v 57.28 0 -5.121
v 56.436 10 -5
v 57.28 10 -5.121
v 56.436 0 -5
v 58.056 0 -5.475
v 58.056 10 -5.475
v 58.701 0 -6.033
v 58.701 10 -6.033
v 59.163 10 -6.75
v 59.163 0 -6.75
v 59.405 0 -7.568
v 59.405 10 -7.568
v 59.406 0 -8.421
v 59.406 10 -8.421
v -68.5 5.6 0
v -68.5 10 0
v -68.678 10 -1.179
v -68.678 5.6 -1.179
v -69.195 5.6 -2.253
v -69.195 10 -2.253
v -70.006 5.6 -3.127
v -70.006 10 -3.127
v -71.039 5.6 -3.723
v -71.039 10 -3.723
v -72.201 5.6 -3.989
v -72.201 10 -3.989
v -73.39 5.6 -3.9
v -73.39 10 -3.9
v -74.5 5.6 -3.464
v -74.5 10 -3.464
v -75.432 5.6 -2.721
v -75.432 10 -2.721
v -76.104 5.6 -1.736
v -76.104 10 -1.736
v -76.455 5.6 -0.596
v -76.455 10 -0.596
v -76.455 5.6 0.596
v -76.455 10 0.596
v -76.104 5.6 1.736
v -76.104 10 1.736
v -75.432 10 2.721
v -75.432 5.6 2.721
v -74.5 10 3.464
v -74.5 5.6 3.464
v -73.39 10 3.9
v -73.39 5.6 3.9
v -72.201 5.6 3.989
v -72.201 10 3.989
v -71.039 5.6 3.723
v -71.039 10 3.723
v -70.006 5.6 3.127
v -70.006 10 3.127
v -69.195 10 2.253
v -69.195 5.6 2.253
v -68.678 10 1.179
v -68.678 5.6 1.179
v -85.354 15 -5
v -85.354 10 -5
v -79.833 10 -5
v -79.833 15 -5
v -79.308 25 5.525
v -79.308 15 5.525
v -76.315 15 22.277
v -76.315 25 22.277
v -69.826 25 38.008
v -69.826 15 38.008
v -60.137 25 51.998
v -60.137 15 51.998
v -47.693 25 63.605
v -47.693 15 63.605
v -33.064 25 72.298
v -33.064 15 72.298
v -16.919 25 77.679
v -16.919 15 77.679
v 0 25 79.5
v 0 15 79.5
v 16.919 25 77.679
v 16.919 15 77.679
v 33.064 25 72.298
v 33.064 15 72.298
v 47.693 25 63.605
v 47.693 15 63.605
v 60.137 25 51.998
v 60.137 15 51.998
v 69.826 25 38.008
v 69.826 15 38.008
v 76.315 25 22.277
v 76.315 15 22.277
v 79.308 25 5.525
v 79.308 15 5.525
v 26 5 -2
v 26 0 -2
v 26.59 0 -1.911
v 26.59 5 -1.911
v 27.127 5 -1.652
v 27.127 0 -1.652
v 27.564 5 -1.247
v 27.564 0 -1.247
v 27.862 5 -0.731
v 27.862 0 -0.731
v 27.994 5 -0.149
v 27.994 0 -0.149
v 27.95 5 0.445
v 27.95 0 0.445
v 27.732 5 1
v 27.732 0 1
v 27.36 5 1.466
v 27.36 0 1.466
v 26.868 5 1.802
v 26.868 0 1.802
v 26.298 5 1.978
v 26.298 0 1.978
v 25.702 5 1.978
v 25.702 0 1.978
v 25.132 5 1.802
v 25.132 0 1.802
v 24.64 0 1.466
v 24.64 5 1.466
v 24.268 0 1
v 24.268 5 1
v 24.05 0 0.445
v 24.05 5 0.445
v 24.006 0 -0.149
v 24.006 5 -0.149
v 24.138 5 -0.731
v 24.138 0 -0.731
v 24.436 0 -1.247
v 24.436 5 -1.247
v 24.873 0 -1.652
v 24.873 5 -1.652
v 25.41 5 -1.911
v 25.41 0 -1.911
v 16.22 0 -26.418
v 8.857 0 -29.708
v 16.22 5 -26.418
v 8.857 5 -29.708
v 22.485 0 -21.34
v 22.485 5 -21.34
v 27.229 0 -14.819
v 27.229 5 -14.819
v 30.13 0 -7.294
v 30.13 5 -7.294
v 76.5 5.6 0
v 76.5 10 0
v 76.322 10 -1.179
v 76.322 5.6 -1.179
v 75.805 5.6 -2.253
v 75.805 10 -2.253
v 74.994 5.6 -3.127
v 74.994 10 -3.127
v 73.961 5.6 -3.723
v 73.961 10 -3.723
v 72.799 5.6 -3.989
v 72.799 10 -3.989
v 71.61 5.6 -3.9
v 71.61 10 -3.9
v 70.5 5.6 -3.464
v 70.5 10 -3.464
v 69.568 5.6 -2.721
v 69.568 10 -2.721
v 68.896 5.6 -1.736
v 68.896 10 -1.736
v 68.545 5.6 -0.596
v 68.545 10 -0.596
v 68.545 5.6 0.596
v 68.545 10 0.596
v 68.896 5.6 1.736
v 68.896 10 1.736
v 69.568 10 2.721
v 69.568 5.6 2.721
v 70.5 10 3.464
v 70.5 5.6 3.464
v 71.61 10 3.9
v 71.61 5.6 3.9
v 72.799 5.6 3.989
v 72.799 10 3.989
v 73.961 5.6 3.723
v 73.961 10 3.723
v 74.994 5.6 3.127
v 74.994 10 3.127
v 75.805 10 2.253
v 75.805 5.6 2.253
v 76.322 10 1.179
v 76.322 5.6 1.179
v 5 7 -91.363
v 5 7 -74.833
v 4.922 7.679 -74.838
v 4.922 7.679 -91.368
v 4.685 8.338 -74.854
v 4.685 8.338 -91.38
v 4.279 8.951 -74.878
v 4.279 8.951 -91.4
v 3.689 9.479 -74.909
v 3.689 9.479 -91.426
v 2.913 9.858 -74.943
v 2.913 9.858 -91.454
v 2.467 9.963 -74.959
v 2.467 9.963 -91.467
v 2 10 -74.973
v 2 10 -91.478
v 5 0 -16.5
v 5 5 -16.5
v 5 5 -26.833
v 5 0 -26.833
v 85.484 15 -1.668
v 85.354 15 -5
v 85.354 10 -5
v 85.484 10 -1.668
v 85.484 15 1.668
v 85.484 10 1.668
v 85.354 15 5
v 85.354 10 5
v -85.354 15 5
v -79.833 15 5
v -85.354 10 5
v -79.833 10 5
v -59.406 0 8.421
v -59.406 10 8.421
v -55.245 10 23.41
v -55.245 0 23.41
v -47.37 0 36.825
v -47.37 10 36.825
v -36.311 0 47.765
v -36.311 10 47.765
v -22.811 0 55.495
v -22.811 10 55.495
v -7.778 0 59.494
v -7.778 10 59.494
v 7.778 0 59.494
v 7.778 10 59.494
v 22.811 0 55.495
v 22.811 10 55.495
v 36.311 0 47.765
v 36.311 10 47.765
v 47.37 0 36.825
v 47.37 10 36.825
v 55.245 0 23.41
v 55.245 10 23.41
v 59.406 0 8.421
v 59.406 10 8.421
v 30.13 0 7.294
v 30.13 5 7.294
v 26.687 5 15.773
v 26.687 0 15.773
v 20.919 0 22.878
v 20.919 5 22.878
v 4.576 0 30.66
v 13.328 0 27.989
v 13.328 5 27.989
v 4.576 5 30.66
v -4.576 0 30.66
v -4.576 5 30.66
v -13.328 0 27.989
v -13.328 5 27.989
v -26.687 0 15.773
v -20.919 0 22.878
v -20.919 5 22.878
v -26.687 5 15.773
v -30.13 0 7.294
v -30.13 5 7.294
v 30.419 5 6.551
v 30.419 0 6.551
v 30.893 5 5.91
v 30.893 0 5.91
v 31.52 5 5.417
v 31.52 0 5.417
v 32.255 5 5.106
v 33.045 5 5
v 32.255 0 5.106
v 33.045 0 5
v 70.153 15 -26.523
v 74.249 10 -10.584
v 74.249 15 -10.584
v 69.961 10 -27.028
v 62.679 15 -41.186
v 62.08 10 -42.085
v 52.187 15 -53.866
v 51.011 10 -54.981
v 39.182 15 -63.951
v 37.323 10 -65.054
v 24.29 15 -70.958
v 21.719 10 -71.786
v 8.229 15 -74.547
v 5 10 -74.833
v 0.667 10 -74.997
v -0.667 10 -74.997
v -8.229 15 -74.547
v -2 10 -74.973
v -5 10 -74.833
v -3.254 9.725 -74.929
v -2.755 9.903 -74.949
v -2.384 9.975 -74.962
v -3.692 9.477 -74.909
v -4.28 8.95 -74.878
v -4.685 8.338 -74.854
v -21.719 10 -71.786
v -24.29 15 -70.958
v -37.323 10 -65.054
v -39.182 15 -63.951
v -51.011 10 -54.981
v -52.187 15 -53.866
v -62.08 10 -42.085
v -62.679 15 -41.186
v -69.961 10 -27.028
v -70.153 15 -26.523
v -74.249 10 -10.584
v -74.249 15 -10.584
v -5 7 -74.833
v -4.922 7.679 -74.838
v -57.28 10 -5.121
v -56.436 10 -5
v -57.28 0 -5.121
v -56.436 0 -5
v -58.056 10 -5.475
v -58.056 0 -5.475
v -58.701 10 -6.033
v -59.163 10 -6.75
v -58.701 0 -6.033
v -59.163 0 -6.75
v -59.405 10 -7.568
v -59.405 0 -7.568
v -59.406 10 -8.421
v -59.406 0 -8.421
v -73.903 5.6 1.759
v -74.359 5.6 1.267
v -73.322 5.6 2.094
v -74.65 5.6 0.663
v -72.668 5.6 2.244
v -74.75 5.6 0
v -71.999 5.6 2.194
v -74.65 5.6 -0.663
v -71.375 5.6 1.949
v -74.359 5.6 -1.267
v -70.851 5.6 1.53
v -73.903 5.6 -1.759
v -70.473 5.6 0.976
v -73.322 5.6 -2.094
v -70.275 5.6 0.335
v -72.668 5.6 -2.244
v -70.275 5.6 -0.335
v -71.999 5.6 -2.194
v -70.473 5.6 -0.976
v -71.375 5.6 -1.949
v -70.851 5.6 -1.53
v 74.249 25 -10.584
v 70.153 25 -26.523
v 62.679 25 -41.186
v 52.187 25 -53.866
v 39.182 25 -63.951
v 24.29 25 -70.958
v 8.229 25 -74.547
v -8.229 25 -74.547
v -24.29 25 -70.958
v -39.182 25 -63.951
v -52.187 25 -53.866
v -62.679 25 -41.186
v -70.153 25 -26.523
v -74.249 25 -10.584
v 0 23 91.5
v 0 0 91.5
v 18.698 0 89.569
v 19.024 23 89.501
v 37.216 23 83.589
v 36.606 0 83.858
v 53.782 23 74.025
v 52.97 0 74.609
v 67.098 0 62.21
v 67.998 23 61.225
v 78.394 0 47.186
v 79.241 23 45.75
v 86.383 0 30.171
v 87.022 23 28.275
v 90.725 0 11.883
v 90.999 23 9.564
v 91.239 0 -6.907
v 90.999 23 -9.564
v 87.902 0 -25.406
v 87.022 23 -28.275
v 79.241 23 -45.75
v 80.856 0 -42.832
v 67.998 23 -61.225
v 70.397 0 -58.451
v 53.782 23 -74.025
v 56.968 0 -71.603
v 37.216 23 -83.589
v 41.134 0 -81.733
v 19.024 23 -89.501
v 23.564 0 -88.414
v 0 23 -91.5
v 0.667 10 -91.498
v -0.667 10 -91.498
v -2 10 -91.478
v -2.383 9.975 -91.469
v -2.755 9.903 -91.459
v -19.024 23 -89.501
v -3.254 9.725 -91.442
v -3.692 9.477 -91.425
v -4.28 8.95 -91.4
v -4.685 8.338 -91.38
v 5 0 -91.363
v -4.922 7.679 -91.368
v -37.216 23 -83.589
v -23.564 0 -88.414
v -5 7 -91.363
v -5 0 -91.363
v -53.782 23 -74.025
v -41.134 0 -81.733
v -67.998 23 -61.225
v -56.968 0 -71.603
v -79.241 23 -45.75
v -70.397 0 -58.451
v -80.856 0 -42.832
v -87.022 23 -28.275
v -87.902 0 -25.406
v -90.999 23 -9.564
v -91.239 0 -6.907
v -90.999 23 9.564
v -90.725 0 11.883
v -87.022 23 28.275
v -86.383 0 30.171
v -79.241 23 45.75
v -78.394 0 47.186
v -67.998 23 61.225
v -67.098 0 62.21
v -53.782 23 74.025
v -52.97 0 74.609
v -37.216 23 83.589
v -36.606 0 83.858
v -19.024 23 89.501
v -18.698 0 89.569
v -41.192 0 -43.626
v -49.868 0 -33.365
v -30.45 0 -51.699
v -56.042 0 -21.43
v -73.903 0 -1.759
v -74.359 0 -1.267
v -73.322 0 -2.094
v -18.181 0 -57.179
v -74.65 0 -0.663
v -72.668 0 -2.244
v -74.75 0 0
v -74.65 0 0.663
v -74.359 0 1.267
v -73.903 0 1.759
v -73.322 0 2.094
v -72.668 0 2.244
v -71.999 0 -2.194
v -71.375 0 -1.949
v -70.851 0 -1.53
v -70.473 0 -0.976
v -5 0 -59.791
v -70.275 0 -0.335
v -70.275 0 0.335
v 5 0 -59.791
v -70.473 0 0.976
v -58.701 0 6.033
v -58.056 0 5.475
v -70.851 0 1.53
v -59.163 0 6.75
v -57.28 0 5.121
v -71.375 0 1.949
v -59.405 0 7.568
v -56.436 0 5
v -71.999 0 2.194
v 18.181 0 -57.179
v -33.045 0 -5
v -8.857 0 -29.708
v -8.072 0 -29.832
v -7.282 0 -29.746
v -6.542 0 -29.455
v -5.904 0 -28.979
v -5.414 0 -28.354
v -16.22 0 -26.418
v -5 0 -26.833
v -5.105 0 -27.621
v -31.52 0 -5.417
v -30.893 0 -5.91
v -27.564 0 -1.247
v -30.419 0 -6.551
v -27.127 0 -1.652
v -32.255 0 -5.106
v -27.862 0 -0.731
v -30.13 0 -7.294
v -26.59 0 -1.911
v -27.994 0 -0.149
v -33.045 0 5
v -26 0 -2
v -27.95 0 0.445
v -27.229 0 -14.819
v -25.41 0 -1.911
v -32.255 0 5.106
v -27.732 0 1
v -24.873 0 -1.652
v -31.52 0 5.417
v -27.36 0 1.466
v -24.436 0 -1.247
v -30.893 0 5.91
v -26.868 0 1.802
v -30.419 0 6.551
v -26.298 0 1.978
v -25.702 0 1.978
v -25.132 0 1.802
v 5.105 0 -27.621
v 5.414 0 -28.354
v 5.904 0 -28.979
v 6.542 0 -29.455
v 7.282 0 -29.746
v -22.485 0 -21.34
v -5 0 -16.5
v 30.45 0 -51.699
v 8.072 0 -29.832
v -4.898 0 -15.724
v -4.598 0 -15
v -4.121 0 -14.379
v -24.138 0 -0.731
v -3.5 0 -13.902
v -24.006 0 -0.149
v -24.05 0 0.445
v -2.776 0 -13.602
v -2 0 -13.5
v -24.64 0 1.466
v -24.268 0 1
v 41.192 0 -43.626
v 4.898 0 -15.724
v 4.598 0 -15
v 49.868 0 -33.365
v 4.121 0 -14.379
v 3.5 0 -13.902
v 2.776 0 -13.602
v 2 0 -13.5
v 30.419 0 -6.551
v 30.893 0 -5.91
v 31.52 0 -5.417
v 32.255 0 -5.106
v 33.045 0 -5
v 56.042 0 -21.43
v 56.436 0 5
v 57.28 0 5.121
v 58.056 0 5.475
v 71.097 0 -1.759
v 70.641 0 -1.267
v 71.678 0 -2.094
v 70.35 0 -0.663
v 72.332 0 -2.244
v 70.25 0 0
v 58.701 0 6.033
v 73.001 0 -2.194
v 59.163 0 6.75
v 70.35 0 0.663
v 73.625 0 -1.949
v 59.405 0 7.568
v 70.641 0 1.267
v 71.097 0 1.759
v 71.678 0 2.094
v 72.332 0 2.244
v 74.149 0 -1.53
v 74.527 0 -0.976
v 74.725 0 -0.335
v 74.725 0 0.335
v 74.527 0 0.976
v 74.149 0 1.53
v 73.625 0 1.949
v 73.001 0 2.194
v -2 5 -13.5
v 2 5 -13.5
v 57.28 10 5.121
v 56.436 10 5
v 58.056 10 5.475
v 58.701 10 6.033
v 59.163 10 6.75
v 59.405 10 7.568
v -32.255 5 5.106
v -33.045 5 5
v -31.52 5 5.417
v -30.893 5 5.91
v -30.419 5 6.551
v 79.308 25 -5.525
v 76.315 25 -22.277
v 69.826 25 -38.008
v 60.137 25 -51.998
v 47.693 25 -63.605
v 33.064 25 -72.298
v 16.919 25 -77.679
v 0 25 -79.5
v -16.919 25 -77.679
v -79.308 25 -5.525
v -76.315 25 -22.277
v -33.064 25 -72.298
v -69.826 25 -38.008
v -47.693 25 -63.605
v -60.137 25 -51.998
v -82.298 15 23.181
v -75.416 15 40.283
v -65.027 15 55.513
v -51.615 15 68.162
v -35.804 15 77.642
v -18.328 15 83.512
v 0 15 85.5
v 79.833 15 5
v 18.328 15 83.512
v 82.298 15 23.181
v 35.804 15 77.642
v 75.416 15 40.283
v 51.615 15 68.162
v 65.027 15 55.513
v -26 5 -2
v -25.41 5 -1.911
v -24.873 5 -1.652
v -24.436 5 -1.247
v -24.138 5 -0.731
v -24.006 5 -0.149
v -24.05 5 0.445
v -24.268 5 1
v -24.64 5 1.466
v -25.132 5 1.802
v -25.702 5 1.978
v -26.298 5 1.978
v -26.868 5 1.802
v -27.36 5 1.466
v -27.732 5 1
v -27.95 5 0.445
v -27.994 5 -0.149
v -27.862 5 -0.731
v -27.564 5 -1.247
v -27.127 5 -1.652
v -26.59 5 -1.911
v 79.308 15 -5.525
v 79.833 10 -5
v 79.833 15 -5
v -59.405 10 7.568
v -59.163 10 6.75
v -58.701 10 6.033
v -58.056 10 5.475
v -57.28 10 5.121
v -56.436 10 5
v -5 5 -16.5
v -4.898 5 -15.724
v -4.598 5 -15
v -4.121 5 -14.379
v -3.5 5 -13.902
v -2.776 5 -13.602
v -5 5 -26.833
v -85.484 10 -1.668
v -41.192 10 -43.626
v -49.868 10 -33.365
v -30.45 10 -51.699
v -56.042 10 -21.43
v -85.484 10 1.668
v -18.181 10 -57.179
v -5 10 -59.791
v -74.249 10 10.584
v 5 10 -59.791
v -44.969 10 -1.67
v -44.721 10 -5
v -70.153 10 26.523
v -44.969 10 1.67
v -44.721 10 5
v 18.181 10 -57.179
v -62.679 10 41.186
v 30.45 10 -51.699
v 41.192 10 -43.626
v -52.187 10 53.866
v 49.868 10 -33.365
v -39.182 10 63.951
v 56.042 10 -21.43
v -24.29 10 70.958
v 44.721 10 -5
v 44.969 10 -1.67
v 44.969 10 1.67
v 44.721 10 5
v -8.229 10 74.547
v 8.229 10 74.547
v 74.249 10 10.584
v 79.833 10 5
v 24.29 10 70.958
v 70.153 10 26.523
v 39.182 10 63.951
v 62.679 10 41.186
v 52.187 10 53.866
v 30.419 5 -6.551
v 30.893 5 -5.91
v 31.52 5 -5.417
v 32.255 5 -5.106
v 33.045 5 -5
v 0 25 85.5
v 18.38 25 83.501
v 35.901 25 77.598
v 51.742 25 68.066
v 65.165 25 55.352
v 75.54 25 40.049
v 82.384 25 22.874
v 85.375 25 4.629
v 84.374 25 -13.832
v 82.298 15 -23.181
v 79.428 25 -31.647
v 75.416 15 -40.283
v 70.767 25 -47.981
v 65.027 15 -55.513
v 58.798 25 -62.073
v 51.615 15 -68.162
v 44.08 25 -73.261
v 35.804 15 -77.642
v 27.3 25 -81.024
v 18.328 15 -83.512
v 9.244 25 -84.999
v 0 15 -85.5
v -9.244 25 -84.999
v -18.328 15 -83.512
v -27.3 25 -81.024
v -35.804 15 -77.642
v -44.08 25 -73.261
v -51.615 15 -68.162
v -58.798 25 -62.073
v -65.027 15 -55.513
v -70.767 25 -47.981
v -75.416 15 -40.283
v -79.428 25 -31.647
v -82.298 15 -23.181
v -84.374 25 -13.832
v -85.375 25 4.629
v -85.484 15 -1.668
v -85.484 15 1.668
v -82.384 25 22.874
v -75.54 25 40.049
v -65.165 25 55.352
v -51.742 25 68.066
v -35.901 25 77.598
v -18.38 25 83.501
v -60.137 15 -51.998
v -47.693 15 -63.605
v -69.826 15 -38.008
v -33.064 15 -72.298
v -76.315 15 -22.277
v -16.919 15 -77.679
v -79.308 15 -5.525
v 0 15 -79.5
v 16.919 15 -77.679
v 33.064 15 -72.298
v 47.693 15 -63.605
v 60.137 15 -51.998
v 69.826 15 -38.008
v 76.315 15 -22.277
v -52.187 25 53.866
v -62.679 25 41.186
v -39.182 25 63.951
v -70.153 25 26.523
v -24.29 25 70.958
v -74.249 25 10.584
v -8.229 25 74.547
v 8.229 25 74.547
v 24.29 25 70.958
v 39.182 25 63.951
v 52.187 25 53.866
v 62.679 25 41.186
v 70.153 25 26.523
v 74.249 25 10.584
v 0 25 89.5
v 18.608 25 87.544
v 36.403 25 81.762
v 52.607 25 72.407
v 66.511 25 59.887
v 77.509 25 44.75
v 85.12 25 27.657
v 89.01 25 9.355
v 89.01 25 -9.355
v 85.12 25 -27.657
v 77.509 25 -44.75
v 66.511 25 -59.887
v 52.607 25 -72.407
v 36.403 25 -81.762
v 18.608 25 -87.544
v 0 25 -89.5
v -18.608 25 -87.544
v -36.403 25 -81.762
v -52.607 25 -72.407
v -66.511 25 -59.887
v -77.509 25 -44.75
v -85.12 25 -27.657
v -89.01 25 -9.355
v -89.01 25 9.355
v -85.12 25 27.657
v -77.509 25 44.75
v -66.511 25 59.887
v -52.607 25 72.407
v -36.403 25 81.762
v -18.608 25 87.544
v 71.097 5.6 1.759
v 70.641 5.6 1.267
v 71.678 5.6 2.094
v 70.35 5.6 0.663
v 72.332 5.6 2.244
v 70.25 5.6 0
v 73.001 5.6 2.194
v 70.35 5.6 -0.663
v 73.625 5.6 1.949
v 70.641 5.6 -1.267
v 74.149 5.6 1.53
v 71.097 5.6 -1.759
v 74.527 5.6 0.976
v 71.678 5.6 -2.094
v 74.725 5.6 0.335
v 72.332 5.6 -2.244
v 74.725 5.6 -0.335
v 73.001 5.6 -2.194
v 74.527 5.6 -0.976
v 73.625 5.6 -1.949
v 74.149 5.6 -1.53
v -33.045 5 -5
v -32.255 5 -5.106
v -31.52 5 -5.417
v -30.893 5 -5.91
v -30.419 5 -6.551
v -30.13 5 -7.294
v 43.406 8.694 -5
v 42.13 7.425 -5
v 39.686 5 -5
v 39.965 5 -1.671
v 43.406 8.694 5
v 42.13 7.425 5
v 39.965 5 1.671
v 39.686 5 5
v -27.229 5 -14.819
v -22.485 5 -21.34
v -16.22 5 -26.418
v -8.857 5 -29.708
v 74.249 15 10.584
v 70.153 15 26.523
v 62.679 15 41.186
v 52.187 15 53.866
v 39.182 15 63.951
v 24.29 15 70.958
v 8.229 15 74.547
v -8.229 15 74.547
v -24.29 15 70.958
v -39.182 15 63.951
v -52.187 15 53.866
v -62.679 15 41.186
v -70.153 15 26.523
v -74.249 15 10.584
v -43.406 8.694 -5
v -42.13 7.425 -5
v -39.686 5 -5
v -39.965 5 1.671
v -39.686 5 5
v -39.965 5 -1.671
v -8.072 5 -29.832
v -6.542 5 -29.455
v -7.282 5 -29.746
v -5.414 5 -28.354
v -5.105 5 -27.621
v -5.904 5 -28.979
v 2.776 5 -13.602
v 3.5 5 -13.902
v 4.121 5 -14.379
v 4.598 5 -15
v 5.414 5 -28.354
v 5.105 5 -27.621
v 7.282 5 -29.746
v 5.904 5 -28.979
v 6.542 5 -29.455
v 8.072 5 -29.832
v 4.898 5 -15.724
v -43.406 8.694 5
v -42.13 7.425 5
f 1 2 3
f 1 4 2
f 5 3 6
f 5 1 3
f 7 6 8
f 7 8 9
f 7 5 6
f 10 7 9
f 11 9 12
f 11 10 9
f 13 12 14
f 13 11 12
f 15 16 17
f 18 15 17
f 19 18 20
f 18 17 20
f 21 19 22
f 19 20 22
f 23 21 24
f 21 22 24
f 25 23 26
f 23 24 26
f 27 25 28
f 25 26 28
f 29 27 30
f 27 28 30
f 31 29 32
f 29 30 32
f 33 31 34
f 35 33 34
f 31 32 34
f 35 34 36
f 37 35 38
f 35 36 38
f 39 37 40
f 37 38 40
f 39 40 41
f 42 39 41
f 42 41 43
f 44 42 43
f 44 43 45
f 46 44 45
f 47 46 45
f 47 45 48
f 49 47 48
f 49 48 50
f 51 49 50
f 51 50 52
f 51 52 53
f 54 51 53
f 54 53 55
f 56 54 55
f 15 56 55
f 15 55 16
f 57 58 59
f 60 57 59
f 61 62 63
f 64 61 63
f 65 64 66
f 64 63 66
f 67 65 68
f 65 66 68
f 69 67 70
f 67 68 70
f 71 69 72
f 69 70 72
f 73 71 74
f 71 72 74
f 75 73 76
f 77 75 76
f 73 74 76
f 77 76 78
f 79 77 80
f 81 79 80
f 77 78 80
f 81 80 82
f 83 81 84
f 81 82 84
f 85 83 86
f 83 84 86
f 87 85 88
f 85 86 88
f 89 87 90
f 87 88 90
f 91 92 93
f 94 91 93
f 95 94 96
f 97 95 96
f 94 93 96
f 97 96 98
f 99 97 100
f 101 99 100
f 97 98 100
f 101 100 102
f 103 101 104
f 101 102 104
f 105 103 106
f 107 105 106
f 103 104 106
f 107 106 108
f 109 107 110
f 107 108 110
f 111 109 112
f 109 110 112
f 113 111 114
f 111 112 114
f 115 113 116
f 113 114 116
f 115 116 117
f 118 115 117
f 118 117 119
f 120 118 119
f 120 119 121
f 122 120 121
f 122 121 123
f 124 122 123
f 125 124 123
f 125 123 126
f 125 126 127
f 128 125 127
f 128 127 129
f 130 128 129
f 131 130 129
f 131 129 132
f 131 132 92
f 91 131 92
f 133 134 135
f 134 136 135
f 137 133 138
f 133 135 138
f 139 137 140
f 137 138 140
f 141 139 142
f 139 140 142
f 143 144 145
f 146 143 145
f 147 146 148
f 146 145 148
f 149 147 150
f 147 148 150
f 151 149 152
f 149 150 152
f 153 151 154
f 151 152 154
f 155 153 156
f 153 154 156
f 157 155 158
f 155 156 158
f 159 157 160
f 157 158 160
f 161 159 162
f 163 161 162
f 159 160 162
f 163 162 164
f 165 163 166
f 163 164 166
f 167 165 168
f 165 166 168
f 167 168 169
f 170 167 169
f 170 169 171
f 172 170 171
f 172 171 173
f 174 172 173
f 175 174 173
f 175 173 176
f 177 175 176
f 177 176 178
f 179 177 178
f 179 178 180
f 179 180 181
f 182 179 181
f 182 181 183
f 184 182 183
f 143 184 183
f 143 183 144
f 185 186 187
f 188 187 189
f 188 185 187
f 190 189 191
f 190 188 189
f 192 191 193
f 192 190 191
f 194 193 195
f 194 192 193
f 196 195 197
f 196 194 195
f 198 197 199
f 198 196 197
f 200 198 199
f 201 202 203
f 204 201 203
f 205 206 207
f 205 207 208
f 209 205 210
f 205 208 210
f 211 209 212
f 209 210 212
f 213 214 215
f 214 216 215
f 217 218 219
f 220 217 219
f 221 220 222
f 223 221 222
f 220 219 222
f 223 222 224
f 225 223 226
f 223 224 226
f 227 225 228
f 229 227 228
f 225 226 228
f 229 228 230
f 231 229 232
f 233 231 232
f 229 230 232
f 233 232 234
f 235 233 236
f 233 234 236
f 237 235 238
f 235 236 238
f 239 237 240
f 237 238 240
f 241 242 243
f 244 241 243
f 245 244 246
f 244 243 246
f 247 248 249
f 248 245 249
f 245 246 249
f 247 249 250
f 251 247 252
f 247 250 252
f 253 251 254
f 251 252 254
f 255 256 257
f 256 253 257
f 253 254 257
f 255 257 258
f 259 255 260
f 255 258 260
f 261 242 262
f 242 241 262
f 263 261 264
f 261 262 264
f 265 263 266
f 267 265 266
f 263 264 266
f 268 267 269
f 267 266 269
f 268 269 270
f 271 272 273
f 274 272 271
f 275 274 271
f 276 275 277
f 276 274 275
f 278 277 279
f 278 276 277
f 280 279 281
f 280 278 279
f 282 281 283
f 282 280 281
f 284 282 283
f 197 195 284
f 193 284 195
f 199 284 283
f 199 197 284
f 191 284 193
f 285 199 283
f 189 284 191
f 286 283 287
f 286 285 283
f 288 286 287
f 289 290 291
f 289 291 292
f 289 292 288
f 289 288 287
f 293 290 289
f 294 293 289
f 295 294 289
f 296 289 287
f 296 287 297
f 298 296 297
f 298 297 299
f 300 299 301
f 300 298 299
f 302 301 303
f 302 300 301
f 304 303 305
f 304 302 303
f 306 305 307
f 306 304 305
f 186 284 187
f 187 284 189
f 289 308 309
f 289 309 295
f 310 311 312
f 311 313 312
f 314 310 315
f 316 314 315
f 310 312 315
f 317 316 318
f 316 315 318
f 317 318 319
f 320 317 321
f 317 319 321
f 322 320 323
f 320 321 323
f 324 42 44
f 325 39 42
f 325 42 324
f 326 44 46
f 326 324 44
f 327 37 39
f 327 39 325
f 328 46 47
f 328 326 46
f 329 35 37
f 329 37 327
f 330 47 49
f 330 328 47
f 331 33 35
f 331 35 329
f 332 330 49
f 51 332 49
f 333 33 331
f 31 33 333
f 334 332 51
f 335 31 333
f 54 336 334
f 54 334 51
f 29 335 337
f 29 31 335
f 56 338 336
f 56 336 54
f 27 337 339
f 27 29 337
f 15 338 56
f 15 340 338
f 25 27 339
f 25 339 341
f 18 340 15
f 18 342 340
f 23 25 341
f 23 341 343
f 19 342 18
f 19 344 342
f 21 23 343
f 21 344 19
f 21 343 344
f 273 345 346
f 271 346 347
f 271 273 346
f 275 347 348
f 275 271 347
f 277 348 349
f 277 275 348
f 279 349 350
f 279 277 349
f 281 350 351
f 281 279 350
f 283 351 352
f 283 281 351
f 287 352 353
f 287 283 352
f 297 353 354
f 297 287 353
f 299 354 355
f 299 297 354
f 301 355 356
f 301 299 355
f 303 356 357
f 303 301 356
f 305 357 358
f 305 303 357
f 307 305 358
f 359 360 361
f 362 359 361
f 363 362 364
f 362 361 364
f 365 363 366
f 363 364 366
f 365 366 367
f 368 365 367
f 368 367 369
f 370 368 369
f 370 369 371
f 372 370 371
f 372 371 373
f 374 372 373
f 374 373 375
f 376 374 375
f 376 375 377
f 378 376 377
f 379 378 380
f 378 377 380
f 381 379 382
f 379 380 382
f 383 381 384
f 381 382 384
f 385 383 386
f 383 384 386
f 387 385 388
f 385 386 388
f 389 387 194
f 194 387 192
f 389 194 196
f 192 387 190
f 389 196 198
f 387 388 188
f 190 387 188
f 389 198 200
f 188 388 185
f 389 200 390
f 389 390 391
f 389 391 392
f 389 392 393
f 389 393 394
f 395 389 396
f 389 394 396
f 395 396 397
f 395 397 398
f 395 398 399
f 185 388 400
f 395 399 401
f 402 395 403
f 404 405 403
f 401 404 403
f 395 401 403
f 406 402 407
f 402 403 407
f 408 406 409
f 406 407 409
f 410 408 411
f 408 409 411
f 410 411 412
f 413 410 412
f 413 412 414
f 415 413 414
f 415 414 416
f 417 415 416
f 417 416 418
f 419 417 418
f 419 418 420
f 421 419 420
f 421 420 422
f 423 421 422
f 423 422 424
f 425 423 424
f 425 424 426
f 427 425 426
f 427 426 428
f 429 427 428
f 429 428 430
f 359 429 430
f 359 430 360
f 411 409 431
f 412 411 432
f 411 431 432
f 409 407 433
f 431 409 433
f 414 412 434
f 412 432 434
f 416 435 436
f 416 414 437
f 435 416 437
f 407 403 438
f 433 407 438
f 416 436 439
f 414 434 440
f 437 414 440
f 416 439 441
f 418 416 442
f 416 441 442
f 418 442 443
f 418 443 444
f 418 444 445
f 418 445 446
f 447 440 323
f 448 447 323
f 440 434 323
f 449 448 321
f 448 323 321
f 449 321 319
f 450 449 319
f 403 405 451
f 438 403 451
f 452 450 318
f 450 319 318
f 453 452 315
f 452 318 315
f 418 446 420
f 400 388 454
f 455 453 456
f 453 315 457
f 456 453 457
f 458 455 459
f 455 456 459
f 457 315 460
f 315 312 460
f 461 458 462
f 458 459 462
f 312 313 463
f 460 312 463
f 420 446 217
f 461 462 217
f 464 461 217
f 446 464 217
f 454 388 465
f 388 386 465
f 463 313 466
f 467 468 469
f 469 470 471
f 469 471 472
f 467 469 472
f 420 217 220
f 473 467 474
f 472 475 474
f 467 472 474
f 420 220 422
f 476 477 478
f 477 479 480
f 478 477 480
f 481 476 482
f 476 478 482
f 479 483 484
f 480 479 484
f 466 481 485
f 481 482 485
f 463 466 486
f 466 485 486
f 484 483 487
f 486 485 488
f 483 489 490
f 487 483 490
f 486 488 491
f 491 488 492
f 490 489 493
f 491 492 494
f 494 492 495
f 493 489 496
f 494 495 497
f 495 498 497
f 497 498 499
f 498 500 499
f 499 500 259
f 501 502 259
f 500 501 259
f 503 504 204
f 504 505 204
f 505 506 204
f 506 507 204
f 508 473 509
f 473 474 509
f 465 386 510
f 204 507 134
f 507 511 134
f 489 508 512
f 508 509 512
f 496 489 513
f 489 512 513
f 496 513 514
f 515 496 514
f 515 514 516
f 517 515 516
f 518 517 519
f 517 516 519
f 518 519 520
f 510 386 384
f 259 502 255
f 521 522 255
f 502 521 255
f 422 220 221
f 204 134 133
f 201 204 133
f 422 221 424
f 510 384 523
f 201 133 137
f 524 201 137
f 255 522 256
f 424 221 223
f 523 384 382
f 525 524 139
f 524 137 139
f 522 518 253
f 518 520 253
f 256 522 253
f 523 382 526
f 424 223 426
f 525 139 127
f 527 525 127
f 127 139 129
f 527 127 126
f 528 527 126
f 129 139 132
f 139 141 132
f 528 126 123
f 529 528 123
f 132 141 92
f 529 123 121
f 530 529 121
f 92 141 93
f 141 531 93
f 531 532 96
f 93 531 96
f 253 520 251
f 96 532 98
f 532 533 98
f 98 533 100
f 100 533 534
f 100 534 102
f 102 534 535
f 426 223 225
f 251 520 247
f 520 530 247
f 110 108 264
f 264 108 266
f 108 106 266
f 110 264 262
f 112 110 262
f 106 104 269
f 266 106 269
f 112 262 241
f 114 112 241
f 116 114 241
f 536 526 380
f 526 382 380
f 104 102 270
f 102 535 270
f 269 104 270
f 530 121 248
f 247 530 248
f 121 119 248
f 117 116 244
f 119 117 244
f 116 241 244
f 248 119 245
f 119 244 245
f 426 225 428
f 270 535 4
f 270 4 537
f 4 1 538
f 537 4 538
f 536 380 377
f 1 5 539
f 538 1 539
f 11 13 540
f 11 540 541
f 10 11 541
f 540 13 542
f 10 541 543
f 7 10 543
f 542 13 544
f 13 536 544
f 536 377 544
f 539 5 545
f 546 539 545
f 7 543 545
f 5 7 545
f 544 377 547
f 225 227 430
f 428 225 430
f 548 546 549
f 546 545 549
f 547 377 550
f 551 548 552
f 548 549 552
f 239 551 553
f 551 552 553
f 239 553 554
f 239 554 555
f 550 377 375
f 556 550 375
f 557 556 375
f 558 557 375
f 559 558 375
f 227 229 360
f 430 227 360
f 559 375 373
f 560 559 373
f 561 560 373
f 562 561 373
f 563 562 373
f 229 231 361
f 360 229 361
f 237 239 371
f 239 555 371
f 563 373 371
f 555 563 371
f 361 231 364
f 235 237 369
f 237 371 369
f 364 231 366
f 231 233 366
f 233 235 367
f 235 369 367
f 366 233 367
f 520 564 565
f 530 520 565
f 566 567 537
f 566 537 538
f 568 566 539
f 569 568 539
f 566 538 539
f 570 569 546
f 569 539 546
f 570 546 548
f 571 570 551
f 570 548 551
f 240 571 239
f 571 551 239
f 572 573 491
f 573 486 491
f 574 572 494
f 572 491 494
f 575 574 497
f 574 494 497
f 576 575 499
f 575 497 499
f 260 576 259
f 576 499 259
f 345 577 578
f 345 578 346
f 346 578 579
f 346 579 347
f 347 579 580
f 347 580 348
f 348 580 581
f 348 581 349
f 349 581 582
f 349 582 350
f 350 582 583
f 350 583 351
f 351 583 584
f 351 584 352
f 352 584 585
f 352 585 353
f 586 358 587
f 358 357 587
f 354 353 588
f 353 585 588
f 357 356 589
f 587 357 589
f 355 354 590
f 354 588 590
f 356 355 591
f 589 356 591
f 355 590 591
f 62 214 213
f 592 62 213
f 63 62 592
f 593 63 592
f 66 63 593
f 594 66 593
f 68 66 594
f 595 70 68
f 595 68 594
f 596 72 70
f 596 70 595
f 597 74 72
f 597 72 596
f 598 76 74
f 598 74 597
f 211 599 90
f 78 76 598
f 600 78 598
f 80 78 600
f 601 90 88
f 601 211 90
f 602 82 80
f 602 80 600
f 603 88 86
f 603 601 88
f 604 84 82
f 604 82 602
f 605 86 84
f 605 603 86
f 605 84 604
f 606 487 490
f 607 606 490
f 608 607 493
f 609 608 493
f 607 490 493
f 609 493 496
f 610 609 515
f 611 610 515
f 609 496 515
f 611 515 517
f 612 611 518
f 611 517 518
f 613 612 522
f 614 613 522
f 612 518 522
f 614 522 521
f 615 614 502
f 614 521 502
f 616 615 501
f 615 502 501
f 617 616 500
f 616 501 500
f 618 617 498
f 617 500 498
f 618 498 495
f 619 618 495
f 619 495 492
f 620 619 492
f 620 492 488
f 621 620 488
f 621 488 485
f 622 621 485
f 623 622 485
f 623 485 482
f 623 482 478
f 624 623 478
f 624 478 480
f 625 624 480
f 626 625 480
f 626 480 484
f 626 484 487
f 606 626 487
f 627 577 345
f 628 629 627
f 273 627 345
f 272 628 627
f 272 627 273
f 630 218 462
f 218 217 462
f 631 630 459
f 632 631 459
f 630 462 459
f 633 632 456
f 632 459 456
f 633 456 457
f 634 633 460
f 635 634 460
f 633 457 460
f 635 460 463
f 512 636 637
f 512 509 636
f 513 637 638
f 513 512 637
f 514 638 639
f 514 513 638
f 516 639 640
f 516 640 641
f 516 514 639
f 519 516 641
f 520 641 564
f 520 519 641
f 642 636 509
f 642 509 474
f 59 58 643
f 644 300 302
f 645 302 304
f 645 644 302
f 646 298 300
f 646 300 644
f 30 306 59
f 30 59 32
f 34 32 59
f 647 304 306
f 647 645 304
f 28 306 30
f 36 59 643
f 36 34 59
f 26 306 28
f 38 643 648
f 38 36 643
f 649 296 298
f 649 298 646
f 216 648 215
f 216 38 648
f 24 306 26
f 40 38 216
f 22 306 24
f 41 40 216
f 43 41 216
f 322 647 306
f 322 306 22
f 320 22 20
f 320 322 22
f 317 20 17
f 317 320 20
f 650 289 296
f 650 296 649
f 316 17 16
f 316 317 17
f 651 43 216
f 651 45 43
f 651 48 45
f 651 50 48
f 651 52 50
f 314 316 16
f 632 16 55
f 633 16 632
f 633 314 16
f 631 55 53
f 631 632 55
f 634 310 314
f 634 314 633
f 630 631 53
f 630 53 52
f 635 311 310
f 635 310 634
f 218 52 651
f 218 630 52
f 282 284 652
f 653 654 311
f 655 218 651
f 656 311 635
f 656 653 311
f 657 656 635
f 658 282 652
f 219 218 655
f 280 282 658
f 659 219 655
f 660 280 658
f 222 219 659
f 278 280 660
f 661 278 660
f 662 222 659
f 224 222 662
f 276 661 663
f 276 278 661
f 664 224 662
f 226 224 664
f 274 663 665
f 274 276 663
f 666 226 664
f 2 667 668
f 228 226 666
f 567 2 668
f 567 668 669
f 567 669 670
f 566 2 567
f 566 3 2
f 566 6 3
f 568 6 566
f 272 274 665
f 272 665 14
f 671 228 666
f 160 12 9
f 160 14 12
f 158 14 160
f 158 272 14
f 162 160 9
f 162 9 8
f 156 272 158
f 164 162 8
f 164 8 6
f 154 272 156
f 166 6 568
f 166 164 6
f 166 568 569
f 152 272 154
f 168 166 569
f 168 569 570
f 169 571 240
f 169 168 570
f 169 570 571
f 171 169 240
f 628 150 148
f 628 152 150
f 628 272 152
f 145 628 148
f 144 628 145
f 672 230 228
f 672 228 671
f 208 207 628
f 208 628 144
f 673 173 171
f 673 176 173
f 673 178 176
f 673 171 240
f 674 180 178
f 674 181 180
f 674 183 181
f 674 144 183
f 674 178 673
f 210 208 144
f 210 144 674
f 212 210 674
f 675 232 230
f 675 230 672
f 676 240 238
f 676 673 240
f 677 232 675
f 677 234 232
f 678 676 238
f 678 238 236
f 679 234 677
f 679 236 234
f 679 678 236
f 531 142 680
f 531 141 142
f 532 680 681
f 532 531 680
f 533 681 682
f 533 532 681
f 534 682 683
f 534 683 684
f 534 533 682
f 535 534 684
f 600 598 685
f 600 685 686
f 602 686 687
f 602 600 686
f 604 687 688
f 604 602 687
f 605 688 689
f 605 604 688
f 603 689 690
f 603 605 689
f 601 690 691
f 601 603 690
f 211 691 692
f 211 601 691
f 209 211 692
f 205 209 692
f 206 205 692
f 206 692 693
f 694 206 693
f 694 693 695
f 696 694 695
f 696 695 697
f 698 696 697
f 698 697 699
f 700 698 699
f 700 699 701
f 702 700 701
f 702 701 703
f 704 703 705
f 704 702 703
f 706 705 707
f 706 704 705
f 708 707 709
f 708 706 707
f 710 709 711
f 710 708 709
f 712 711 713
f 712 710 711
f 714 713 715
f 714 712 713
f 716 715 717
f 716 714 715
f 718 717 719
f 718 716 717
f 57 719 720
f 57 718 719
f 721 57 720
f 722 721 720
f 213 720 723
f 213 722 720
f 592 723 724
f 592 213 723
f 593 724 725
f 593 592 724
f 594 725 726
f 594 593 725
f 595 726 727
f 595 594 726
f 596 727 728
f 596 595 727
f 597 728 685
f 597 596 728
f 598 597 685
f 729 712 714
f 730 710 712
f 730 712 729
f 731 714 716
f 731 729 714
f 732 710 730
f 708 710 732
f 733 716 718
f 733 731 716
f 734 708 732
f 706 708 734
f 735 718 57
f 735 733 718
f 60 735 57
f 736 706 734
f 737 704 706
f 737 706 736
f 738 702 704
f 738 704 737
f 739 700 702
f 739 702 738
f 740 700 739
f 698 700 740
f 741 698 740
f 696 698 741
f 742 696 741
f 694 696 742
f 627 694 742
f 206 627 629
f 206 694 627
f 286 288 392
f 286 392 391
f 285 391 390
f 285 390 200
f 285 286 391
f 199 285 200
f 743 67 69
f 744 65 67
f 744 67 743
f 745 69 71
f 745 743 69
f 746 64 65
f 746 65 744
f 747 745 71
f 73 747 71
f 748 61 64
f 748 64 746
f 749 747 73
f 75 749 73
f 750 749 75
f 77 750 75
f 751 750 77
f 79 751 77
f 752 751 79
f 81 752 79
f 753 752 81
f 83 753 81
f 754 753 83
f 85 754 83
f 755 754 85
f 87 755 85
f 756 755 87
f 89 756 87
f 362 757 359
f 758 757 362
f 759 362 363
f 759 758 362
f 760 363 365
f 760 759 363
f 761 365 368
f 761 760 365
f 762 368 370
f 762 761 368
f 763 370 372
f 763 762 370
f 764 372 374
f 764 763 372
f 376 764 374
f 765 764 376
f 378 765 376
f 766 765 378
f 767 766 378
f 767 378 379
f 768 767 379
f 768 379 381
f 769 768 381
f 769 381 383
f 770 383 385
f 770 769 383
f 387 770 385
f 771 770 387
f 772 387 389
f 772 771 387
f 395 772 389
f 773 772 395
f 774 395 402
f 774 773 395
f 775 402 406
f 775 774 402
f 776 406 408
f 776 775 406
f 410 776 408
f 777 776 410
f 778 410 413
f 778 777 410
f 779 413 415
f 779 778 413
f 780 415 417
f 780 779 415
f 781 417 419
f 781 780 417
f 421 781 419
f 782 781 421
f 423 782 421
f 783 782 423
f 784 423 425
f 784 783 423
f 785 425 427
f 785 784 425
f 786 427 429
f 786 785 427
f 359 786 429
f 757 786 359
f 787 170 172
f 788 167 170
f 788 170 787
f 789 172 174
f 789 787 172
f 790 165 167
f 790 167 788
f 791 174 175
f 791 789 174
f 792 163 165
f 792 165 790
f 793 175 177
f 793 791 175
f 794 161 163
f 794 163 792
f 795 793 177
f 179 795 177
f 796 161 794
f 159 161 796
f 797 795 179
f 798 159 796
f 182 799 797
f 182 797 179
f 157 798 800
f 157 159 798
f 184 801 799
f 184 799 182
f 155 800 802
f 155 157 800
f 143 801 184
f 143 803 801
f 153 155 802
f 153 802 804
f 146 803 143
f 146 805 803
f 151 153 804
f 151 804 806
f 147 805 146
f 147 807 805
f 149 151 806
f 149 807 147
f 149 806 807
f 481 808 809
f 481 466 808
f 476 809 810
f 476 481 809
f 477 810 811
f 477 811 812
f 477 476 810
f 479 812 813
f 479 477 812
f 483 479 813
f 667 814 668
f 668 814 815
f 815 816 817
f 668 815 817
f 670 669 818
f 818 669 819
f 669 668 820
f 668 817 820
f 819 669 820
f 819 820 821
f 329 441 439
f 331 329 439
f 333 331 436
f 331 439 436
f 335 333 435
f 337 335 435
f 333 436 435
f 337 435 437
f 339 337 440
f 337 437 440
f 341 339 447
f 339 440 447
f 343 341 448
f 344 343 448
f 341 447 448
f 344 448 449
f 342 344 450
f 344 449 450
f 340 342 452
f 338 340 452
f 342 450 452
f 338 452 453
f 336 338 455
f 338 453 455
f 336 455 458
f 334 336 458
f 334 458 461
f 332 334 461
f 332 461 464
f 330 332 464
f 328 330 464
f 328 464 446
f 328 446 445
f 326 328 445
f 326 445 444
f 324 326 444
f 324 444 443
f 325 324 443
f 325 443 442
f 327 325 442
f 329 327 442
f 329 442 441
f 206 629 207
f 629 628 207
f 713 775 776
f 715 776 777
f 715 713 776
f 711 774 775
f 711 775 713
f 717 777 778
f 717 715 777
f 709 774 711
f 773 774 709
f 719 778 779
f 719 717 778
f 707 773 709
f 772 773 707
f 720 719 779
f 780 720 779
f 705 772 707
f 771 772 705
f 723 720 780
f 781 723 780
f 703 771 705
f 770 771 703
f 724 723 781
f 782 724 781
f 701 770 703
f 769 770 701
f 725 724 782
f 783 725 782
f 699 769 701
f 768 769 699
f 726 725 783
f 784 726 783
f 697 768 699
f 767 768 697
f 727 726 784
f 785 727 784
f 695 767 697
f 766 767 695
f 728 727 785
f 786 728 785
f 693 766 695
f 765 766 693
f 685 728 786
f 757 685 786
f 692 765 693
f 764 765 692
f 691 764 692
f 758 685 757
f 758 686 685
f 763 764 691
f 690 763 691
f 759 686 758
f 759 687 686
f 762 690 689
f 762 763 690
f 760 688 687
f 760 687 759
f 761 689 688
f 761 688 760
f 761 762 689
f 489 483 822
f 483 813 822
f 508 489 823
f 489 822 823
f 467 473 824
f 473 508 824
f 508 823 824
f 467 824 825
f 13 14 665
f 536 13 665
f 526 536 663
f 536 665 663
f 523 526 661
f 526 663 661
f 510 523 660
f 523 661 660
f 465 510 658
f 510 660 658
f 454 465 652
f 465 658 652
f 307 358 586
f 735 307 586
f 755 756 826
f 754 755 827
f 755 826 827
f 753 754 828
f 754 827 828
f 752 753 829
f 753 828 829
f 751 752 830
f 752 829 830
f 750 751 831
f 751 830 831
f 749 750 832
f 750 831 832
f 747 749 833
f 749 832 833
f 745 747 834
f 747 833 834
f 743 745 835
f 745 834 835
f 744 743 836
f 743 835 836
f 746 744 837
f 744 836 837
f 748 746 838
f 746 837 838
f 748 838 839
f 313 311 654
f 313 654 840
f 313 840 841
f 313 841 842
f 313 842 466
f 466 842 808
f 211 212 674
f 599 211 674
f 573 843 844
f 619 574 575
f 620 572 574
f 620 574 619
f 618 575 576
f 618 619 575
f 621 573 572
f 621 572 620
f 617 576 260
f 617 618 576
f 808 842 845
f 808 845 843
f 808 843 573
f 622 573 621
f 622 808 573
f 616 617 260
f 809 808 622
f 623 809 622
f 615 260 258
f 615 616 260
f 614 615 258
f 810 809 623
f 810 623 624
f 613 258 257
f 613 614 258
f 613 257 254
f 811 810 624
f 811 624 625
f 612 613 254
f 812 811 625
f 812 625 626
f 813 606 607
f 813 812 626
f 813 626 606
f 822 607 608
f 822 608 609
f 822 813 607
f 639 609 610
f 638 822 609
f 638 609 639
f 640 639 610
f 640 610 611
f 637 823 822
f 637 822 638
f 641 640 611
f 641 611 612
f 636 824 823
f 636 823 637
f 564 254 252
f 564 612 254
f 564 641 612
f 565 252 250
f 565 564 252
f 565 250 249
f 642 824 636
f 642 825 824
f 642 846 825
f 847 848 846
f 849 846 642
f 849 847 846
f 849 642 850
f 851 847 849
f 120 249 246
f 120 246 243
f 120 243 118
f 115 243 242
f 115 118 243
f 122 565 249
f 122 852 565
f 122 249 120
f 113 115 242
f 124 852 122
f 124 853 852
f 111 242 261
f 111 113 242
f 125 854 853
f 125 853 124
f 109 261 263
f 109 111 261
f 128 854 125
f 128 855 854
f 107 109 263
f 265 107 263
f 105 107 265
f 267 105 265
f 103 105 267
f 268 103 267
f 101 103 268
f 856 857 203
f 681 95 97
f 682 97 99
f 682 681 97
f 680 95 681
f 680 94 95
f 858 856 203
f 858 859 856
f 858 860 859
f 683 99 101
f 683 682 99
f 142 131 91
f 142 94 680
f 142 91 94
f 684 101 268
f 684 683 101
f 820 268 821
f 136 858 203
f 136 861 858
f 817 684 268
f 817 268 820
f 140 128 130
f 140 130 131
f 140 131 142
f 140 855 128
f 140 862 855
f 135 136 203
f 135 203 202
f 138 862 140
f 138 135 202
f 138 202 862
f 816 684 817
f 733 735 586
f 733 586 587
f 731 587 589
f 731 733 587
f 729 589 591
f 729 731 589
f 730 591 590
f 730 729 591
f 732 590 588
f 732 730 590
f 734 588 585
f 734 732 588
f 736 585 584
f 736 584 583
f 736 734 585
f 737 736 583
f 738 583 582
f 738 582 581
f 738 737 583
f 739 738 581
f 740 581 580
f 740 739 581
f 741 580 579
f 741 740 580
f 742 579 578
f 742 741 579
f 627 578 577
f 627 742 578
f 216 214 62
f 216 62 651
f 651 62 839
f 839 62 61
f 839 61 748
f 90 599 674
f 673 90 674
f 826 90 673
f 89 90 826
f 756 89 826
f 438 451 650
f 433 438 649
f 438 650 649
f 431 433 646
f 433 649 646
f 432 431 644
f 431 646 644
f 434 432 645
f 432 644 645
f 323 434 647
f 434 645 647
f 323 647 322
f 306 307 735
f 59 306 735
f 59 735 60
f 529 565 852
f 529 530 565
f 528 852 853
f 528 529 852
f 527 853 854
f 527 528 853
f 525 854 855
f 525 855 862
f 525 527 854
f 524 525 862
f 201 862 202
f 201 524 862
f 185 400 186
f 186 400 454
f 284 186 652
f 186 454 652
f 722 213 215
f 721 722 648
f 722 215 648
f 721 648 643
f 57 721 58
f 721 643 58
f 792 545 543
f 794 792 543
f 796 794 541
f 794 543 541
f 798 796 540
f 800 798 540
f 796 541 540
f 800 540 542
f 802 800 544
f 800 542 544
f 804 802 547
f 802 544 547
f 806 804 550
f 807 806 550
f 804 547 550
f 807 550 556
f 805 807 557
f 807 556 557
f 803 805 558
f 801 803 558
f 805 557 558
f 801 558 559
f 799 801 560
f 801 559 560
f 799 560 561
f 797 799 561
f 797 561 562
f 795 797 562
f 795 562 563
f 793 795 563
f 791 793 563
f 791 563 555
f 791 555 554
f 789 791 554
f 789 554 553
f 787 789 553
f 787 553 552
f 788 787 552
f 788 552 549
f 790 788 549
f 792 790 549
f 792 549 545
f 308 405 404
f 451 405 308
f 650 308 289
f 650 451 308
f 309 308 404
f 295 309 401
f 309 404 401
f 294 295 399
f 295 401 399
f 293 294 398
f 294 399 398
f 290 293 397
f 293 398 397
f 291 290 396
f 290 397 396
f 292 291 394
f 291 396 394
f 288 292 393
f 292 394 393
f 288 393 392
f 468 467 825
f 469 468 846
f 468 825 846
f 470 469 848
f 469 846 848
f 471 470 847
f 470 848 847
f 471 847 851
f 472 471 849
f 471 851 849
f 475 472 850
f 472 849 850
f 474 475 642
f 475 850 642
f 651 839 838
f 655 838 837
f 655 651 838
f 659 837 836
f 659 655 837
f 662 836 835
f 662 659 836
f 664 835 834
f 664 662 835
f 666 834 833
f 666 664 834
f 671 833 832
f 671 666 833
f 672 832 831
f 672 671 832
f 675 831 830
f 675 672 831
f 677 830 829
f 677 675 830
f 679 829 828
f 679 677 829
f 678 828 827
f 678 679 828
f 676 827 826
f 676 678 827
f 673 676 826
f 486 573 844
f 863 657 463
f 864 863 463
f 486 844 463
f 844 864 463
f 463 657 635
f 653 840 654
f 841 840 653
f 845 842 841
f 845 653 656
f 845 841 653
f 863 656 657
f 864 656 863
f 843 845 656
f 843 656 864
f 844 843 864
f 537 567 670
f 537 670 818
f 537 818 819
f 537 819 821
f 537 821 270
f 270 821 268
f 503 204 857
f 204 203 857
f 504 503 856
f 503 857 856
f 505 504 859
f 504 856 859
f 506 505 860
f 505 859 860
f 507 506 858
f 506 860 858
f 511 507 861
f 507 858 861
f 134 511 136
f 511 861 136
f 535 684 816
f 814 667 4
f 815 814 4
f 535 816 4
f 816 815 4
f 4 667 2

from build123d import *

# Parameters (mm, degrees)
SKETCH1_R                                           = 91.5
BOSS_EXTRUDE1_DEPTH                                 = 10
CUT_EXTRUDE1_DEPTH                                  = 130.78636292
SKETCH3_R                                           = 40
CUT_EXTRUDE2_DEPTH                                  = 5
SKETCH4_R                                           = 91.5
SKETCH4_R_2                                         = 75
BOSS_EXTRUDE2_DEPTH                                 = 5
SKETCH5_R                                           = 91.5
SKETCH5_R_2                                         = 85.5
BOSS_EXTRUDE3_DEPTH                                 = 10
CHAMFER1_SIZE                                       = 2
F_4_5_4_5_DIAMETER_HOLE1_D                          = 4.5
CUT_EXTRUDE3_DEPTH                                  = 91
FILLET1_R                                           = 3
CHAMFER2_SIZE                                       = 5
CHAMFER3_SIZE                                       = 5
SKETCH10_W                                          = 10
SKETCH10_H                                          = 20
CUT_EXTRUDE4_DEPTH                                  = 91
FILLET2_R                                           = 3
FILLET3_R                                           = 3
BOSS_EXTRUDE4_DEPTH                                 = 10
SKETCH12_W                                          = 10
SKETCH12_H                                          = 35
CUT_EXTRUDE5_DEPTH                                  = 10
FILLET4_R                                           = 3
SKETCH13_R                                          = 2
CUT_EXTRUDE6_DEPTH                                  = 10
CBORE_FOR_M4_HEX_SOCKET_HEAD_CAP_SCREW1_D           = 4.5
CBORE_FOR_M4_HEX_SOCKET_HEAD_CAP_SCREW1_CBORE_D     = 8
CBORE_FOR_M4_HEX_SOCKET_HEAD_CAP_SCREW1_CBORE_DEPTH = 4.4


# Some blends are built 0.0001 mm under size
with BuildPart() as part:
    # Sketch1 → Boss-Extrude1 (new body)
    with BuildSketch(Plane(origin=(0, 0, 0), x_dir=(1, 0, 0), z_dir=(0, 1, 0))):
        with Locations(Location((0, 0, 0), (0, 0, 270))):
            Circle(SKETCH1_R)
    extrude(amount=BOSS_EXTRUDE1_DEPTH)

    # Sketch2 → Cut-Extrude1 (cut, through all)
    with BuildSketch(Plane(origin=(0, 10, 0), x_dir=(1, 0, 0), z_dir=(0, 1, 0))):
        with BuildLine():
            ThreePointArc((59.791303716, 5), (0, 60), (-59.791303716, 5))
            Line((-59.791303716, 5), (-30.594117082, 5))
            ThreePointArc((-30.594117082, 5), (0, 31), (30.594117082, 5))
            Line((30.594117082, 5), (59.791303716, 5))
        make_face()
        with BuildLine():
            Line((-30.594117082, -5), (-59.791303716, -5))
            ThreePointArc((-59.791303716, -5), (0, -60), (59.791303716, -5))
            Line((59.791303716, -5), (30.594117082, -5))
            ThreePointArc((30.594117082, -5), (0, -31), (-30.594117082, -5))
        make_face()
    extrude(amount=-CUT_EXTRUDE1_DEPTH, mode=Mode.SUBTRACT)

    # Sketch3 → Cut-Extrude2 (cut)
    with BuildSketch(Plane(origin=(0, 10, 0), x_dir=(1, 0, 0), z_dir=(0, 1, 0))):
        Circle(SKETCH3_R)
    extrude(amount=-CUT_EXTRUDE2_DEPTH, mode=Mode.SUBTRACT)

    # Sketch4 → Boss-Extrude2 (add)
    with BuildSketch(Plane(origin=(0, 10, 0), x_dir=(1, 0, 0), z_dir=(0, 1, 0))):
        with Locations(Location((0, 0, 0), (0, 0, 270))):
            Circle(SKETCH4_R)
        with Locations(Location((0, 0, 0), (0, 0, 270))):
            Circle(SKETCH4_R_2, mode=Mode.SUBTRACT)
    extrude(amount=BOSS_EXTRUDE2_DEPTH)

    # Sketch5 → Boss-Extrude3 (add)
    with BuildSketch(Plane(origin=(0, 15, 0), x_dir=(1, 0, 0), z_dir=(0, 1, 0))):
        with Locations(Location((0, 0, 0), (0, 0, 270))):
            Circle(SKETCH5_R)
        with Locations(Location((0, 0, 0), (0, 0, 270))):
            Circle(SKETCH5_R_2, mode=Mode.SUBTRACT)
    extrude(amount=BOSS_EXTRUDE3_DEPTH)

    # Chamfer1
    chamfer1_edges = [part.edges().sort_by_distance(p)[0] for p in [
        (0, 25, -91.5),
    ]]
    chamfer(chamfer1_edges, length=CHAMFER1_SIZE)

    # Ø4.5 (4.5) Diameter Hole1 (through all)
    with Locations(Plane(origin=(0, 10, 0), x_dir=(1, 0, 0), z_dir=(0, 1, 0))):
        with Locations((-72.5, 0), (72.5, 0)):
            Hole(F_4_5_4_5_DIAMETER_HOLE1_D / 2)

    # Sketch9 → Cut-Extrude3 (cut)
    with BuildSketch(Plane(origin=(0, 10, 0), x_dir=(1, 0, 0), z_dir=(0, 1, 0))):
        with BuildLine():
            Line((-85.353675961, 5), (85.353675961, 5))
            ThreePointArc((85.353675961, 5), (85.5, 0), (85.353675961, -5))
            Line((85.353675961, -5), (-85.353675961, -5))
            ThreePointArc((-85.353675961, -5), (-85.5, 0), (-85.353675961, 5))
        make_face()
    extrude(amount=CUT_EXTRUDE3_DEPTH, mode=Mode.SUBTRACT)

    # Fillet1
    fillet1_edges = [part.edges().sort_by_distance(p)[0] for p in [
        (-59.791303716, 5, -5),
        (59.791303716, 5, -5),
        (59.791303716, 5, 5),
        (-59.791303716, 5, 5),
    ]]
    fillet(fillet1_edges, radius=FILLET1_R)

    # Chamfer2
    chamfer2_edges = [part.edges().sort_by_distance(p)[0] for p in [
        (-40, 10, 0),
        (40, 10, 0),
    ]]
    chamfer(chamfer2_edges, length=CHAMFER2_SIZE - 0.0001)  # a hair under: the kernel refuses the full size

    # Chamfer3
    # the kernel refuses this chamfer: 5.369942673, 5 mm, written as the material it takes off along each edge
    with BuildSketch(Plane(origin=(-74.833147735, 29.456298598, -5), x_dir=(0.10396392346922531, 0, -0.9945810689013164), z_dir=(0, -1, 0))) as chamfer3_piece_1:
        with BuildLine():
            Line((5.614084599, 0), (-CHAMFER3_SIZE * 0.103963923469, -CHAMFER3_SIZE * 0.994581068901))
            Line((-CHAMFER3_SIZE * 0.103963923469, -CHAMFER3_SIZE * 0.994581068901), (0, 0))
            ThreePointArc((0, 0), (2.890602355, -0.05250177), (5.614084599, 0))
        make_face()
    extrude(amount=19.456298598, mode=Mode.SUBTRACT)
    with BuildSketch(Plane(origin=(-74.833147735, 29.456298598, 5), x_dir=(-1, 0, 0), z_dir=(0, -1, 0)), Plane(origin=(74.833147735, 29.456298598, -5), x_dir=(1, 0, 0), z_dir=(0, -1, 0))) as chamfer3_piece_2:
        with BuildLine():
            Line((CHAMFER3_SIZE, 0), (-0.583662262, -5.583662262))
            ThreePointArc((-0.583662262, -5.583662262), (-0.248301095, -2.88039667), (0, 0))
            Line((0, 0), (CHAMFER3_SIZE, 0))
        make_face()
    extrude(amount=19.456298598, mode=Mode.SUBTRACT)
    with BuildSketch(Plane(origin=(74.833147735, 29.456298598, 5), x_dir=(1, 0, 0), z_dir=(0, -1, 0))) as chamfer3_piece_3:
        with BuildLine():
            Line((CHAMFER3_SIZE, 0), (-0.583662262, 5.583662262))
            ThreePointArc((-0.583662262, 5.583662262), (-0.248301095, 2.88039667), (0, 0))
            Line((0, 0), (CHAMFER3_SIZE, 0))
        make_face()
    extrude(amount=19.456298598, mode=Mode.SUBTRACT)

    # Sketch10 → Cut-Extrude4 (cut)
    with BuildSketch(Plane.XY.offset(-40)):
        Rectangle(SKETCH10_W, SKETCH10_H)
    extrude(amount=-CUT_EXTRUDE4_DEPTH, mode=Mode.SUBTRACT)

    # Fillet2
    fillet2_edges = [part.edges().sort_by_distance(p)[0] for p in [
        (5, 10, -83.098216789),
        (-5, 10, -83.098216789),
    ]]
    fillet(fillet2_edges, radius=FILLET2_R)

    # Fillet3
    fillet3_edges = [part.edges().sort_by_distance(p)[0] for p in [
        (-30.594117082, 2.5, -5),
        (-30.594117082, 2.5, 5),
        (30.594117082, 2.5, 5),
        (30.594117082, 2.5, -5),
    ]]
    fillet(fillet3_edges, radius=FILLET3_R)

    # Sketch11 → Boss-Extrude4 (add)
    with BuildSketch(Plane(origin=(0, 15, 0), x_dir=(1, 0, 0), z_dir=(0, 1, 0))):
        with BuildLine():
            Line((-74.249485474, 10.583662262), (-79.307755217, 5.525392519))
            ThreePointArc((-79.307755217, 5.525392519), (0, 79.5), (79.307755217, 5.525392519))
            Line((79.307755217, 5.525392519), (74.249485474, 10.583662262))
            ThreePointArc((74.249485474, 10.583662262), (0, 75), (-74.249485474, 10.583662262))
        make_face()
        with BuildLine():
            Line((-74.249485474, -10.583662262), (-79.307755217, -5.525392519))
            ThreePointArc((-79.307755217, -5.525392519), (0, -79.5), (79.307755217, -5.525392519))
            Line((79.307755217, -5.525392519), (74.249485474, -10.583662262))
            ThreePointArc((74.249485474, -10.583662262), (0, -75), (-74.249485474, -10.583662262))
        make_face()
    extrude(amount=BOSS_EXTRUDE4_DEPTH)

    # Sketch12 → Cut-Extrude5 (cut)
    with BuildSketch(Plane(origin=(0, 5, 0), x_dir=(1, 0, 0), z_dir=(0, 1, 0))):
        with Locations((0, 31)):
            Rectangle(SKETCH12_W, SKETCH12_H)
    extrude(amount=-CUT_EXTRUDE5_DEPTH, mode=Mode.SUBTRACT)

    # Fillet4
    fillet4_edges = [part.edges().sort_by_distance(p)[0] for p in [
        (5, 2.5, -30.594117082),
        (5, 2.5, -13.5),
        (-5, 2.5, -30.594117082),
        (-5, 2.5, -13.5),
    ]]
    fillet(fillet4_edges, radius=FILLET4_R)

    # Sketch13 → Cut-Extrude6 (cut)
    with BuildSketch(Plane(origin=(0, 0, 0), x_dir=(-1, 0, 0), z_dir=(0, -1, 0))):
        with Locations(Location((26, 0, 0), (0, 0, 90))):
            Circle(SKETCH13_R)
        with Locations(Location((-26, 0, 0), (0, 0, 90))):
            Circle(SKETCH13_R)
    extrude(amount=-CUT_EXTRUDE6_DEPTH, mode=Mode.SUBTRACT)

    # CBORE for M4 Hex Socket Head Cap Screw1 (through all)
    with Locations(Plane(origin=(0, 10, 0), x_dir=(1, 0, 0), z_dir=(0, 1, 0))):
        with Locations((-72.5, 0), (72.5, 0)):
            CounterBoreHole(CBORE_FOR_M4_HEX_SOCKET_HEAD_CAP_SCREW1_D / 2, CBORE_FOR_M4_HEX_SOCKET_HEAD_CAP_SCREW1_CBORE_D / 2, CBORE_FOR_M4_HEX_SOCKET_HEAD_CAP_SCREW1_CBORE_DEPTH)


solid = part.part
